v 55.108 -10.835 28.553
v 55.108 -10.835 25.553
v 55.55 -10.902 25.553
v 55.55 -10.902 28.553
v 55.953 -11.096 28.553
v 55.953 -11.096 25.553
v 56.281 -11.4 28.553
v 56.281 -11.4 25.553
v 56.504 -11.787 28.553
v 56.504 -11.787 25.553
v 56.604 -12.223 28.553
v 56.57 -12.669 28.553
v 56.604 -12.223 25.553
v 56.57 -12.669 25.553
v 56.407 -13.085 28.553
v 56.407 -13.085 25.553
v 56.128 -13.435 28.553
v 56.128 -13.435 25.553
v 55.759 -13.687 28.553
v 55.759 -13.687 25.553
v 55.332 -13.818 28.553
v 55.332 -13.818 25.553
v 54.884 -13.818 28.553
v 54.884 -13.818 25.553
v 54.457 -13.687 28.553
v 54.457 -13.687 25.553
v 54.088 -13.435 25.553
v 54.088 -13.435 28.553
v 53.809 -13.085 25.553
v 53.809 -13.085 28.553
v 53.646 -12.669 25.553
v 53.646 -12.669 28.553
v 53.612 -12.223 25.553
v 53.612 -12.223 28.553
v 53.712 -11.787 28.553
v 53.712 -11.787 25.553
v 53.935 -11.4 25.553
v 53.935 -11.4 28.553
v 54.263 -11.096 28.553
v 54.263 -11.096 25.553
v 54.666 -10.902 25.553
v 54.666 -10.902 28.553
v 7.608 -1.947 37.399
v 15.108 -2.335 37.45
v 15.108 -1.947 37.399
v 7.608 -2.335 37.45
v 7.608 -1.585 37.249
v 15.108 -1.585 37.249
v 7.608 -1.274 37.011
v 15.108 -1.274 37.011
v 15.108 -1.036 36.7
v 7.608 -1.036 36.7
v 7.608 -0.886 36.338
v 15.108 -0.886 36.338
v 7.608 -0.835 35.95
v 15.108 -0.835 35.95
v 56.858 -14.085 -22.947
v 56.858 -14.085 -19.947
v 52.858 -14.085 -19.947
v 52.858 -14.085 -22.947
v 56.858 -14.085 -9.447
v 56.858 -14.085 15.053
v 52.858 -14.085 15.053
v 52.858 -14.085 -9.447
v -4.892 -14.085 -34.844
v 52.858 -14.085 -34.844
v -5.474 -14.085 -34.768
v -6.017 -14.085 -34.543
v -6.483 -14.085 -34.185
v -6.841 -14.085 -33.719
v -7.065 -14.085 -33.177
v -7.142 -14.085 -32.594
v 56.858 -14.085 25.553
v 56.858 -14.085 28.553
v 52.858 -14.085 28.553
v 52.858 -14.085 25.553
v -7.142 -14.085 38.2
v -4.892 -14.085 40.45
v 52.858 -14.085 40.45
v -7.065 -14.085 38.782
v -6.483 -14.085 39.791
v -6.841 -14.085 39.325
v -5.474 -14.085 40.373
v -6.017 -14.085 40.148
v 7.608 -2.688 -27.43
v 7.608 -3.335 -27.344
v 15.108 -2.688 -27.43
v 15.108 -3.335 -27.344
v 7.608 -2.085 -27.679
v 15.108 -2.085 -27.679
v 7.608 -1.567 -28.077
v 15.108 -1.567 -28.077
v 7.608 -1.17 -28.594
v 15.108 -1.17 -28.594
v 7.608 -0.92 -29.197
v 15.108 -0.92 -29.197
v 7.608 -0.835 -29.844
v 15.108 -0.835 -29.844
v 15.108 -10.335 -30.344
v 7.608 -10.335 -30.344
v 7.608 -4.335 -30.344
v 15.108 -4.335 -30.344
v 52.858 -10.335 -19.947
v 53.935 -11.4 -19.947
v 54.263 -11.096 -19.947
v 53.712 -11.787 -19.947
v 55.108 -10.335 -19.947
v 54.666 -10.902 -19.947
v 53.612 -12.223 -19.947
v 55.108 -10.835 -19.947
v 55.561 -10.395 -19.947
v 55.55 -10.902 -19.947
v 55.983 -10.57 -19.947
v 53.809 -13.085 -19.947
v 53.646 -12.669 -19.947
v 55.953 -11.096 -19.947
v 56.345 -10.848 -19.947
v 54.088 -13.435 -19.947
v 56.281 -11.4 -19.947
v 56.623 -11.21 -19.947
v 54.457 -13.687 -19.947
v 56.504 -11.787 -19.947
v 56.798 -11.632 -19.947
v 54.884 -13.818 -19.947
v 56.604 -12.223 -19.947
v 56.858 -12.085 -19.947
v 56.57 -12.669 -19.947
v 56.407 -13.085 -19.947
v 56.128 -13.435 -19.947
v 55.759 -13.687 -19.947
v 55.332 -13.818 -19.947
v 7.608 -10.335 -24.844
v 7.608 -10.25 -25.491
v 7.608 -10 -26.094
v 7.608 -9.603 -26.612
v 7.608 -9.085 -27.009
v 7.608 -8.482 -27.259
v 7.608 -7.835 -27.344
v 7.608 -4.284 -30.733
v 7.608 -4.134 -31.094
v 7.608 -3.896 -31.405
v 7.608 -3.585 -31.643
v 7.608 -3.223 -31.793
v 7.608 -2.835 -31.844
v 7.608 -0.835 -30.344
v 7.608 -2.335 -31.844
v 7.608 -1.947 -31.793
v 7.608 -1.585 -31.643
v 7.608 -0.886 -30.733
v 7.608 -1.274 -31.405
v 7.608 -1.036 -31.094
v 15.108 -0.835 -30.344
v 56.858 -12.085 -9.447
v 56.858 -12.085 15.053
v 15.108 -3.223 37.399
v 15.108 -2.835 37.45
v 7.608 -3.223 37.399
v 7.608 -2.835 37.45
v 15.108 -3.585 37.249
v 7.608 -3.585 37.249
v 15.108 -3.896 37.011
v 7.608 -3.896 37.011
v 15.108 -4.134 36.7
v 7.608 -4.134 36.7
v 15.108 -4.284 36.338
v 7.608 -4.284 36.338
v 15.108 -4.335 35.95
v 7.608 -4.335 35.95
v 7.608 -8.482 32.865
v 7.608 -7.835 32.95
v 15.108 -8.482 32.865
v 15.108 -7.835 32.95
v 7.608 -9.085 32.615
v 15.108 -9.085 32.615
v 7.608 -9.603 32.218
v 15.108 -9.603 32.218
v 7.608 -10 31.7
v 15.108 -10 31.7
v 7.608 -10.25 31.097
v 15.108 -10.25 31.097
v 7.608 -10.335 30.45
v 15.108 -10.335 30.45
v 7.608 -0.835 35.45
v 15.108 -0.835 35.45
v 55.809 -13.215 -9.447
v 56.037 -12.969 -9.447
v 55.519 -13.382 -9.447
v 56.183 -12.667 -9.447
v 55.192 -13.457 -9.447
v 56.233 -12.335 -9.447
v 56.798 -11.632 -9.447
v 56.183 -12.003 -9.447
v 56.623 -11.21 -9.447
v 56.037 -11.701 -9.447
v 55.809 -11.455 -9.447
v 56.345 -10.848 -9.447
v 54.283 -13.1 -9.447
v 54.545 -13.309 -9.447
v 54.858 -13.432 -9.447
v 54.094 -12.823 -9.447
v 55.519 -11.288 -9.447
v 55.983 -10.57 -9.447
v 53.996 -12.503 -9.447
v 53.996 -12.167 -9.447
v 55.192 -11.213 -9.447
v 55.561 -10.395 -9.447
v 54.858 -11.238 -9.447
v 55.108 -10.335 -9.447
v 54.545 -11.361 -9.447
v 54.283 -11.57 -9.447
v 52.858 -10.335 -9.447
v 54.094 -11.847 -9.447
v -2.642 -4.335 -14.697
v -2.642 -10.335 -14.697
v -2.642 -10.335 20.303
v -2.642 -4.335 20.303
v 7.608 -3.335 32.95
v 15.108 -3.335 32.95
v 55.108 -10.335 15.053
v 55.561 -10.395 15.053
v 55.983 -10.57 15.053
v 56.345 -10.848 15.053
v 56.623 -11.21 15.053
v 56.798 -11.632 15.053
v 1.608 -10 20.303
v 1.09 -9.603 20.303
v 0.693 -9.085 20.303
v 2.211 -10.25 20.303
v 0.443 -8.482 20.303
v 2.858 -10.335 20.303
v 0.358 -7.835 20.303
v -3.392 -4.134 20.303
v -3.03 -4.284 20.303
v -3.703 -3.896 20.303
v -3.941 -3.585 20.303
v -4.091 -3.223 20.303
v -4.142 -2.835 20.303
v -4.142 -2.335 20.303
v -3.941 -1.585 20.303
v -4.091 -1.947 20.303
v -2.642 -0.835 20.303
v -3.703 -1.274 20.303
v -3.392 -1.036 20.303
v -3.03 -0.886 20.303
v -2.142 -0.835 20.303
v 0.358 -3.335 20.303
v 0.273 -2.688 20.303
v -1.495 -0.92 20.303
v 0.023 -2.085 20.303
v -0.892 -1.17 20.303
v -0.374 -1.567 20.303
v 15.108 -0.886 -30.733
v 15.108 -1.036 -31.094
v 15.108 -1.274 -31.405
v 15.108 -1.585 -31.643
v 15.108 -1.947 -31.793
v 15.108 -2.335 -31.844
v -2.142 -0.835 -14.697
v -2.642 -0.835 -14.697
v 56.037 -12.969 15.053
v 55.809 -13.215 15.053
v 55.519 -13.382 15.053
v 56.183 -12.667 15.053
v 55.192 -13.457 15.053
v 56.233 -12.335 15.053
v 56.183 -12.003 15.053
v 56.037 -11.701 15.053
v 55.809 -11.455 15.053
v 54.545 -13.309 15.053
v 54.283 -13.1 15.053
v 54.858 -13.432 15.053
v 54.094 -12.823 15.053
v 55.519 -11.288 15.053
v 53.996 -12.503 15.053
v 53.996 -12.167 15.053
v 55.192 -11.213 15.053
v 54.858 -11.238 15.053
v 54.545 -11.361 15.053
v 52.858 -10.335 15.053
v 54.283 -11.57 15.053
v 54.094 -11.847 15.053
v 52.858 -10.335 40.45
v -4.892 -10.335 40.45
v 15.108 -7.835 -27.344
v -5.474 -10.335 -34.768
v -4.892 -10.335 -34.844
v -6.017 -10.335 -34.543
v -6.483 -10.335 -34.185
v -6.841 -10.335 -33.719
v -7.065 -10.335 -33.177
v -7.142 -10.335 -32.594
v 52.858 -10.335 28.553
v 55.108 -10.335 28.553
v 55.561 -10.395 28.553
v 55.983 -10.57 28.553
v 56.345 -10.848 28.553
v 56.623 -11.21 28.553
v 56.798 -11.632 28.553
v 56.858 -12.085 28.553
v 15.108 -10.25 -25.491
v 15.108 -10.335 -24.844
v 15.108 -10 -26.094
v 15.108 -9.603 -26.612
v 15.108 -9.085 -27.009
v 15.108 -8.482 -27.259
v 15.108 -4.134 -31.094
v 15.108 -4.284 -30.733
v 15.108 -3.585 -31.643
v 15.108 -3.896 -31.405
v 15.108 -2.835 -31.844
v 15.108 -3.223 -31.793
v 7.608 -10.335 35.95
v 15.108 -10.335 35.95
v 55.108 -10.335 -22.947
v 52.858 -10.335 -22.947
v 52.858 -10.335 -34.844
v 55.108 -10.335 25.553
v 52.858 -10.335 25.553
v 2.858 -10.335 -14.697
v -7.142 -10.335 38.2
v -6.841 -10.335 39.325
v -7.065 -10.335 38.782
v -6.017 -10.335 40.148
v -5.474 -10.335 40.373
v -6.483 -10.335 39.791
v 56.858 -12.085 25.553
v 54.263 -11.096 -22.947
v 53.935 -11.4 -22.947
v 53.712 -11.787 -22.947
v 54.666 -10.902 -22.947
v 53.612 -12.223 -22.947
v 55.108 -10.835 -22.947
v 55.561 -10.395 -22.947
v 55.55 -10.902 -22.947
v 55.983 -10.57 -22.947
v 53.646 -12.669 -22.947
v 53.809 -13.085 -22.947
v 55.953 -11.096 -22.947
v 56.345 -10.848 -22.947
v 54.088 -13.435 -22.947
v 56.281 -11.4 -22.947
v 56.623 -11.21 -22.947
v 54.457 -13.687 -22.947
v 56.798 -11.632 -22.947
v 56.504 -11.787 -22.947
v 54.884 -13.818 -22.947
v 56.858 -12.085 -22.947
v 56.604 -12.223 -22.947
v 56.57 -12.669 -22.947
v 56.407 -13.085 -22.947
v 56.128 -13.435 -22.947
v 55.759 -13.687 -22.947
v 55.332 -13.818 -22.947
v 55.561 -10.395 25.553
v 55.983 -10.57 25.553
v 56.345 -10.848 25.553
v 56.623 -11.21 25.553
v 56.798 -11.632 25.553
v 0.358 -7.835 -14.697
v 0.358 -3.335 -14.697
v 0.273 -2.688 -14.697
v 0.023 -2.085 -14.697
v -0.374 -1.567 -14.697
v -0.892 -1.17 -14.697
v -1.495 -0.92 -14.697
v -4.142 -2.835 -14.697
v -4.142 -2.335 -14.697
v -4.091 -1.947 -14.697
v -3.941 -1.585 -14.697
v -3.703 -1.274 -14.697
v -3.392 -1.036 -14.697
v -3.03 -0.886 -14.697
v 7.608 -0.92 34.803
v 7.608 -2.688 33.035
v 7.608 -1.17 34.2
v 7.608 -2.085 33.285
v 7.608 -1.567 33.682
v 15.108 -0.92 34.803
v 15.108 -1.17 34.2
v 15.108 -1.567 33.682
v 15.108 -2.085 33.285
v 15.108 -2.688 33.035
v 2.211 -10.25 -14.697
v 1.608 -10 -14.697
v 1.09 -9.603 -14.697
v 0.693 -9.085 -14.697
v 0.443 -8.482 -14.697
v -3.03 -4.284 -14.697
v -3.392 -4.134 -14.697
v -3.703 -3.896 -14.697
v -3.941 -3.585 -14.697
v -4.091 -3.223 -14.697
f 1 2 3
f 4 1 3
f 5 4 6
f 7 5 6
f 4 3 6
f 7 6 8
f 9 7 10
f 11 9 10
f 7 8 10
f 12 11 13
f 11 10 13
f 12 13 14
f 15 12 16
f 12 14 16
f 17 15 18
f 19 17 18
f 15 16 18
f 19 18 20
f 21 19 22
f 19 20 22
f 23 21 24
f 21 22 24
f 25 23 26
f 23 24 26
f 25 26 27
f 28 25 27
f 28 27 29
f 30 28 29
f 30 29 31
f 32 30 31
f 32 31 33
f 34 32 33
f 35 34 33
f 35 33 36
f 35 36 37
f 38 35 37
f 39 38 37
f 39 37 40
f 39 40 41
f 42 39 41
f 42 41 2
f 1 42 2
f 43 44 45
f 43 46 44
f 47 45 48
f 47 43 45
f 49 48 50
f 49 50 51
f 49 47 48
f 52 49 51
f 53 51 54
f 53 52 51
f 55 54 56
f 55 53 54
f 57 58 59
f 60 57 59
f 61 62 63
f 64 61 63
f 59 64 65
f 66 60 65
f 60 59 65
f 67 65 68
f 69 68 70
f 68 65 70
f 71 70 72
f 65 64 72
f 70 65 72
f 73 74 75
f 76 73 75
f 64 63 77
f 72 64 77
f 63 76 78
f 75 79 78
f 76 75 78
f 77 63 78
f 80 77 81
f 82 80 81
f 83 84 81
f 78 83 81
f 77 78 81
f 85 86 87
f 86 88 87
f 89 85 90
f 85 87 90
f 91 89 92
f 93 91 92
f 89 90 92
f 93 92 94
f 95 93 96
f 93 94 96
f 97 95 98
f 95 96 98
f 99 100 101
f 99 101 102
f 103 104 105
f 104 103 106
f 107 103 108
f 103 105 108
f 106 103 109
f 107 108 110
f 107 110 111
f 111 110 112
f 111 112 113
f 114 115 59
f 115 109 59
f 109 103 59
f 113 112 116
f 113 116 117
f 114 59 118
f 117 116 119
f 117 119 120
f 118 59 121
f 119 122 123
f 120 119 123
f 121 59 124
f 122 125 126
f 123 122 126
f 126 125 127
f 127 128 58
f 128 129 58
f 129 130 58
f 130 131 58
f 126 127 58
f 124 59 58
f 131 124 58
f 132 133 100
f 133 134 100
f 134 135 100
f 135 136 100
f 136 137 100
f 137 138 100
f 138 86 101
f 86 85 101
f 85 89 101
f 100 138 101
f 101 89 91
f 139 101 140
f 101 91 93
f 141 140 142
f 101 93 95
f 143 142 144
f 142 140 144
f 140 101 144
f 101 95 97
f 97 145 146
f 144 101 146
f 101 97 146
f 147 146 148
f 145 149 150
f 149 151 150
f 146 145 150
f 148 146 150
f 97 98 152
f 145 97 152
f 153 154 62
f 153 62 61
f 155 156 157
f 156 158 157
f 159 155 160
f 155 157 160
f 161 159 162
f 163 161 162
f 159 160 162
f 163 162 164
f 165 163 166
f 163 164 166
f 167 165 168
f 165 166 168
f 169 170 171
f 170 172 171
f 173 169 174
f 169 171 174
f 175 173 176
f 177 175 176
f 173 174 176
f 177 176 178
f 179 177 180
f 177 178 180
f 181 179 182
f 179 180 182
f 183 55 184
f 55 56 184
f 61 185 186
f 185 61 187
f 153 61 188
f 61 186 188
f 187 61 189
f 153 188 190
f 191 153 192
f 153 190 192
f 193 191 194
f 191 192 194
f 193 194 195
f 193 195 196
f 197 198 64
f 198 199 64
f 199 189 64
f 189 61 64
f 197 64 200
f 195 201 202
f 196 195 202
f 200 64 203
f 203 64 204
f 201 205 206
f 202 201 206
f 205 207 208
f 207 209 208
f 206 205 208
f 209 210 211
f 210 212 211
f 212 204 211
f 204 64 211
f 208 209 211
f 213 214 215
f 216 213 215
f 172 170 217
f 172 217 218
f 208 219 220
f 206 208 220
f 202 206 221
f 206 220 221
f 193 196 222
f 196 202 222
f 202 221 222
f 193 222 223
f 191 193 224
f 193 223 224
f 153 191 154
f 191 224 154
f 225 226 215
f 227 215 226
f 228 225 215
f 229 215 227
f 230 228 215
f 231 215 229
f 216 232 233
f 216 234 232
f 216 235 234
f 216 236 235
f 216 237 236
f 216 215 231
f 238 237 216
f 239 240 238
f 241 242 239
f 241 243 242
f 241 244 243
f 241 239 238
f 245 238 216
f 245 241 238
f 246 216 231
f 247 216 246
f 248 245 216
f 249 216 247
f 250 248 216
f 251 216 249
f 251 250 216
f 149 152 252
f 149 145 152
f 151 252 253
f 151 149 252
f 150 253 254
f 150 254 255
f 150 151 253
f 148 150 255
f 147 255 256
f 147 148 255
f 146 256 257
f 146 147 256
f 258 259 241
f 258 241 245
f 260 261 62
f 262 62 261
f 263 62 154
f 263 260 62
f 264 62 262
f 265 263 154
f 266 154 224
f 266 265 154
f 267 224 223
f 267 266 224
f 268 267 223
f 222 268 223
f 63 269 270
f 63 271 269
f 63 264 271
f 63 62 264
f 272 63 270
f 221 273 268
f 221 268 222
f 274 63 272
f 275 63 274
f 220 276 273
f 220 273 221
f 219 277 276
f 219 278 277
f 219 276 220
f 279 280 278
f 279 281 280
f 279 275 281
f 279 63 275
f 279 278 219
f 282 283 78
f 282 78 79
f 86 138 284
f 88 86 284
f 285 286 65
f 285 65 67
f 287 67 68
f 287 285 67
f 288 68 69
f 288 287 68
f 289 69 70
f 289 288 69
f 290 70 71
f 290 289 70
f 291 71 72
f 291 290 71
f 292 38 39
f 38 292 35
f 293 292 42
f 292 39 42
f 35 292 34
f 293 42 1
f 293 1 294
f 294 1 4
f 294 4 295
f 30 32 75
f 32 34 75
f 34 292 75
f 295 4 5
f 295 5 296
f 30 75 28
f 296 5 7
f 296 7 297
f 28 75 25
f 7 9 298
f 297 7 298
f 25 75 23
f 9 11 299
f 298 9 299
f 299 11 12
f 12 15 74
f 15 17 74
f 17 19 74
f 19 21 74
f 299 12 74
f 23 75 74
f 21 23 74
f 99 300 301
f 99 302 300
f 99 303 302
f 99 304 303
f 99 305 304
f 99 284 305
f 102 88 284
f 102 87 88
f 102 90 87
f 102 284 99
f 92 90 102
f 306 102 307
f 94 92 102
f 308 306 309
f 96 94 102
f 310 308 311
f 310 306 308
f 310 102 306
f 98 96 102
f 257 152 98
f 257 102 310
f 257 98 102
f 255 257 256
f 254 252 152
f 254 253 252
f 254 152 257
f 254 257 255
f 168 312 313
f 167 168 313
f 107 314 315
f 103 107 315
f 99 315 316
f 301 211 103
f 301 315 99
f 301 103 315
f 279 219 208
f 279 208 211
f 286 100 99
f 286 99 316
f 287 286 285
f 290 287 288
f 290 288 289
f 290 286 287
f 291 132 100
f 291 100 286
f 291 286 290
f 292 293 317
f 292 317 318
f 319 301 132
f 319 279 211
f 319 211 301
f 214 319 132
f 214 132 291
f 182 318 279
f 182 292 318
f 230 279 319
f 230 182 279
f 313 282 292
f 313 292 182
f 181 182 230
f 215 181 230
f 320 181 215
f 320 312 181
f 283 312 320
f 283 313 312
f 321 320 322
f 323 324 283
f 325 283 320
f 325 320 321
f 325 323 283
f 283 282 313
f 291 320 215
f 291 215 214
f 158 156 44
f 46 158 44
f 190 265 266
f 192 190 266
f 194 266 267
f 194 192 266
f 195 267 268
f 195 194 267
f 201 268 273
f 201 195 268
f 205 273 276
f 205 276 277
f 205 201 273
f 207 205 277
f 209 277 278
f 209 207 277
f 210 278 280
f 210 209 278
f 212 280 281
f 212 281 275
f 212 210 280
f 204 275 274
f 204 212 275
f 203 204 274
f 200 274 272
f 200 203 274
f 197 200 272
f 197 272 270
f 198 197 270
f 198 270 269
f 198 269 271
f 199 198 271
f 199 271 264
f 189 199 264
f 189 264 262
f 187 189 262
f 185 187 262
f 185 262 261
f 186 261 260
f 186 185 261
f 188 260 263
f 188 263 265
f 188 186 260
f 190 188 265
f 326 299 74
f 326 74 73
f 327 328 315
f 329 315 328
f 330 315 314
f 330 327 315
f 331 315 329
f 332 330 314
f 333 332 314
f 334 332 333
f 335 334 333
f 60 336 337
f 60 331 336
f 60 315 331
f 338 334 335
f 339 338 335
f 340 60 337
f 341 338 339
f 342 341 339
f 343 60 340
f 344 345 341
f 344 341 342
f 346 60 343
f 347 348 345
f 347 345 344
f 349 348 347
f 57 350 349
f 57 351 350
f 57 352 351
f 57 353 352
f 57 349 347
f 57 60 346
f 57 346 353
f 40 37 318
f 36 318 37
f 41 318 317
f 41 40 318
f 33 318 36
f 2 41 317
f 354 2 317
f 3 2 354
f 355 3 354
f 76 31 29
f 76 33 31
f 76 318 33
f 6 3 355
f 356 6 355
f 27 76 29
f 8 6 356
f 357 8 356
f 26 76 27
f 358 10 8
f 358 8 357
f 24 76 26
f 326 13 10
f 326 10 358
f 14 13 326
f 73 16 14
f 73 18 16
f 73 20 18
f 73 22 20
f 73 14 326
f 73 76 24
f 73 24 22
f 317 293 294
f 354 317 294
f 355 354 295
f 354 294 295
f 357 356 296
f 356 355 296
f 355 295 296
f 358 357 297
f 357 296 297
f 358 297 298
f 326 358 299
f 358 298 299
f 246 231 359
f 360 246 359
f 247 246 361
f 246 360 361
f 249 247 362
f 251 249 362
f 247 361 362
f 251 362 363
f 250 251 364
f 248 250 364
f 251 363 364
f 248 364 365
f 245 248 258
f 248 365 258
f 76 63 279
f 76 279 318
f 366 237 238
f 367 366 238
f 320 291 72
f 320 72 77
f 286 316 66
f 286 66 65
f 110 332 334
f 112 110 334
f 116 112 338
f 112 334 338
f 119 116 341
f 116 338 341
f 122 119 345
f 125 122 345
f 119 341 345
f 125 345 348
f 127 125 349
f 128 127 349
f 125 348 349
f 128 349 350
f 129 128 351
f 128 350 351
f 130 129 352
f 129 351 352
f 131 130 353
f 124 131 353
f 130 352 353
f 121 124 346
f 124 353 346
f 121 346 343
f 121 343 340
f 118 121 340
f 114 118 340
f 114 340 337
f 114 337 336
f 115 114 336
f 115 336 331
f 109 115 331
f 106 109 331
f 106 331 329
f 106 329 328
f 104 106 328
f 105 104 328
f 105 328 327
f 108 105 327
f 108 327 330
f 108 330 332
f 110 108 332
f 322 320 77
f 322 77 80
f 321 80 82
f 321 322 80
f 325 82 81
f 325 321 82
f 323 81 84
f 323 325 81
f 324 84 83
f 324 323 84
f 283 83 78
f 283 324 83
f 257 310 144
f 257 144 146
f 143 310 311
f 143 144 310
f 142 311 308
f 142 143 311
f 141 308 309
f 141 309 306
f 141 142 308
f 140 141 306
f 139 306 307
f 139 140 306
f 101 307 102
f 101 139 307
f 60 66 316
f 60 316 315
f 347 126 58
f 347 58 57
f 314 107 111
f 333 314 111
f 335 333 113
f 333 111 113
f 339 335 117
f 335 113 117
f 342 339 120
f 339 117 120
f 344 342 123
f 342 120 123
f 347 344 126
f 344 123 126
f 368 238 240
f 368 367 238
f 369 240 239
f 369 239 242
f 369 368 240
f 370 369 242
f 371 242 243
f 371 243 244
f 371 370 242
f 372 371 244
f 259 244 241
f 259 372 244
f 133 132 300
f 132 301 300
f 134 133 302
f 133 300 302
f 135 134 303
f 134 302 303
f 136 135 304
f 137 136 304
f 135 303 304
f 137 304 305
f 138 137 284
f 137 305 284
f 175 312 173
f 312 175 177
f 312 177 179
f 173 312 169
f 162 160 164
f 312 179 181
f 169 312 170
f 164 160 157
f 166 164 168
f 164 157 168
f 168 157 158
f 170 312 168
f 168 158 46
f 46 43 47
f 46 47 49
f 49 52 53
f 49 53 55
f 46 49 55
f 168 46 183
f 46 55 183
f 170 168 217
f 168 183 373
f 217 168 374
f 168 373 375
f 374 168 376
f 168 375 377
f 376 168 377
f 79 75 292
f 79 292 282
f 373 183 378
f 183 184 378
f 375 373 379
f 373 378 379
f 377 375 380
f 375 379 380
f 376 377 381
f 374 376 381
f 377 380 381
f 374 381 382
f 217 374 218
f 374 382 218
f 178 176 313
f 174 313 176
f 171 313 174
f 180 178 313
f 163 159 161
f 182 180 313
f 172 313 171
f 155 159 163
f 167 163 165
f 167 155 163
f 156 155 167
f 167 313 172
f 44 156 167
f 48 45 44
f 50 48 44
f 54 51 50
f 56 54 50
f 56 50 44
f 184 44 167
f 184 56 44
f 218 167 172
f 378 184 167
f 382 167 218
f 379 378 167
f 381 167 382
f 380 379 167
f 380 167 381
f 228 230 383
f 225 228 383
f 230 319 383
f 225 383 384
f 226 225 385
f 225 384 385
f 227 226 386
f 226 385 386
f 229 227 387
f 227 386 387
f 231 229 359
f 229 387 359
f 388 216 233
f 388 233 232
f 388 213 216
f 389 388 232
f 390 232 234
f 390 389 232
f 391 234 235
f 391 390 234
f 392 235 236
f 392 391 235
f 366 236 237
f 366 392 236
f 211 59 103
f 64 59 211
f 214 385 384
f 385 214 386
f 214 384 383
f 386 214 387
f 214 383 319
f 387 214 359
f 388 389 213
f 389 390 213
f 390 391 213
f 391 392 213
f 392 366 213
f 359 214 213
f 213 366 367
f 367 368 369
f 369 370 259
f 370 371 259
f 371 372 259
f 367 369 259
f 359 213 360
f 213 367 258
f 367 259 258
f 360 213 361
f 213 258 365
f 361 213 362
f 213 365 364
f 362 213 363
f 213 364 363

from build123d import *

# Parameters (mm, degrees)
EXTRUDE_START       = 0.25
EXTRUDE_BASE_DEPTH  = 3.75
FILLET1_R           = 1.75
SKETCH2_W           = 4
SKETCH2_H           = 10.5
SKETCH2_H_2         = 11.8971
CUT_EXTRUDE2_DEPTH  = 70.879033956
SKETCH4_R           = 1.5
CUT_EXTRUDE3_DEPTH  = 87.315736962
SKETCH6_W           = 3
SKETCH6_H           = 17.5
SKETCH6_W_2         = 7.5
SKETCH6_H_2         = 3
BOSS_EXTRUDE2_DEPTH = 9.5
SKETCH7_W           = 1.5
SKETCH7_H           = 3.5
BOSS_EXTRUDE3_DEPTH = 35
SKETCH8_W           = 1.5
SKETCH8_H           = 3.5
BOSS_EXTRUDE4_DEPTH = 7.5
SKETCH9_W           = 1.5
SKETCH9_H           = 3.5
BOSS_EXTRUDE5_DEPTH = 7.5
FILLET2_R           = 1.5
FILLET3_R           = 2.5
BOSS_EXTRUDE6_START = -24.5
SKETCH11_R          = 1.5
SKETCH11_R_2        = 1.125
BOSS_EXTRUDE6_DEPTH = 24.5


# Some blends are built 0.0001 mm under size
with BuildPart() as part:
    # Sketch1 → Extrude Base (new body)
    with BuildSketch(Plane.XZ.offset(10.085054916).offset(EXTRUDE_START)):
        with BuildLine():
            Line((56.857940404, 38.199863775), (56.857940404, -32.594336225))
            ThreePointArc((56.857940404, -32.594336225), (56.198930662, -34.185326483), (54.607940404, -34.844336225))
            Line((54.607940404, -34.844336225), (-4.892059596, -34.844336225))
            ThreePointArc((-4.892059596, -34.844336225), (-6.483049854, -34.185326483), (-7.142059596, -32.594336225))
            Line((-7.142059596, -32.594336225), (-7.142059596, 38.199863775))
            ThreePointArc((-7.142059596, 38.199863775), (-6.483049854, 39.790854032), (-4.892059596, 40.449863775))
            Line((-4.892059596, 40.449863775), (54.607940404, 40.449863775))
            ThreePointArc((54.607940404, 40.449863775), (56.198930662, 39.790854032), (56.857940404, 38.199863775))
        make_face()
    extrude(amount=EXTRUDE_BASE_DEPTH)

    # Fillet1
    # the kernel refuses this fillet: 1.75 mm, written as the material it takes off along each edge
    with BuildSketch(Plane(origin=(56.857940404, -10.335054916, 42.574863775), x_dir=(0, -1, 0), z_dir=(0, 0, -1))) as fillet1_piece_1:
        with BuildLine():
            CenterArc((FILLET1_R, FILLET1_R), FILLET1_R, 180, 90)
            Line((0, FILLET1_R), (0, 0))
            Line((0, 0), (FILLET1_R, 0))
        make_face()
    extrude(amount=79.5442, mode=Mode.SUBTRACT)

    # Sketch2 → Cut-Extrude2 (cut, through all)
    with BuildSketch(Plane.XZ.offset(14.085054916)):
        with Locations((54.857940404, 20.302763775)):
            Rectangle(SKETCH2_W, SKETCH2_H)
        with Locations((54.857940404, -14.697236225)):
            Rectangle(SKETCH2_W, SKETCH2_H)
        with Locations((54.857940404, -28.895786225)):
            Rectangle(SKETCH2_W, SKETCH2_H_2)
        with Locations((54.857940404, 34.501313775)):
            Rectangle(SKETCH2_W, SKETCH2_H_2)
    extrude(amount=-CUT_EXTRUDE2_DEPTH, mode=Mode.SUBTRACT)

    # Sketch4 → Cut-Extrude3 (cut, through all)
    with BuildSketch(Plane(origin=(0, 0, -22.947236225), x_dir=(-1, 0, 0), z_dir=(0, 0, -1))):
        with Locations(Location((-55.107940404, -12.335054916, 0), (0, 0, 90))):
            Circle(SKETCH4_R)
    extrude(amount=-CUT_EXTRUDE3_DEPTH, mode=Mode.SUBTRACT)

    # Sketch6 → Boss-Extrude2 (add)
    with BuildSketch(Plane(origin=(0, -10.335054916, 0), x_dir=(1, 0, 0), z_dir=(0, 1, 0))):
        with Locations((-1.142059596, -11.552763775)):
            Rectangle(SKETCH6_W, SKETCH6_H)
        with Locations((-1.142059596, 5.947236225)):
            Rectangle(SKETCH6_W, SKETCH6_H)
        with Locations((11.357940404, 28.844336225)):
            Rectangle(SKETCH6_W_2, SKETCH6_H_2)
        with Locations((11.357940404, -34.449863775)):
            Rectangle(SKETCH6_W_2, SKETCH6_H_2)
    extrude(amount=BOSS_EXTRUDE2_DEPTH)

    # Sketch7 → Boss-Extrude3 (add)
    with BuildSketch(Plane.XY.offset(20.302763775)):
        with Locations((-3.392059596, -2.585054916)):
            Rectangle(SKETCH7_W, SKETCH7_H)
    extrude(amount=-BOSS_EXTRUDE3_DEPTH)

    # Sketch8 → Boss-Extrude4 (add)
    with BuildSketch(Plane(origin=(15.107940404, 0, 0), x_dir=(0, 0, -1), z_dir=(1, 0, 0))):
        with Locations((31.094336225, -2.585054916)):
            Rectangle(SKETCH8_W, SKETCH8_H)
    extrude(amount=-BOSS_EXTRUDE4_DEPTH)

    # Sketch9 → Boss-Extrude5 (add)
    with BuildSketch(Plane(origin=(15.107940404, 0, 0), x_dir=(0, 0, -1), z_dir=(1, 0, 0))):
        with Locations((-36.699863775, -2.585054916)):
            Rectangle(SKETCH9_W, SKETCH9_H)
    extrude(amount=-BOSS_EXTRUDE5_DEPTH)

    # Fillet2
    fillet2_edges = [part.edges().sort_by_distance(p)[0] for p in [
        (11.357940404, -0.835054916, -31.844336225),
        (11.357940404, -4.335054916, -31.844336225),
        (-4.142059596, -0.835054916, 2.802763775),
        (-4.142059596, -4.335054916, 2.802763775),
        (11.357940404, -0.835054916, 37.449863775),
        (11.357940404, -4.335054916, 37.449863775),
    ]]
    fillet(fillet2_edges, radius=FILLET2_R - 0.0001)  # a hair under: the kernel refuses the full size

    # Fillet3
    fillet3_edges = [part.edges().sort_by_distance(p)[0] for p in [
        (0.357940404, -10.335054916, 2.802763775),
        (0.357940404, -0.835054916, 2.802763775),
        (11.357940404, -10.335054916, -27.344336225),
        (11.357940404, -0.835054916, -27.344336225),
        (11.357940404, -0.835054916, 32.949863775),
        (11.357940404, -10.335054916, 32.949863775),
    ]]
    fillet(fillet3_edges, radius=FILLET3_R)

    # Sketch11 → Boss-Extrude6 (add)
    with BuildSketch(Plane.XY.offset(15.052763775).offset(BOSS_EXTRUDE6_START)):
        with Locations(Location((55.107940404, -12.335054916, 0), (0, 0, 90))):
            Circle(SKETCH11_R)
        with Locations((55.107940404, -12.335054916)):
            Circle(SKETCH11_R_2, mode=Mode.SUBTRACT)
    extrude(amount=BOSS_EXTRUDE6_DEPTH)


solid = part.part
